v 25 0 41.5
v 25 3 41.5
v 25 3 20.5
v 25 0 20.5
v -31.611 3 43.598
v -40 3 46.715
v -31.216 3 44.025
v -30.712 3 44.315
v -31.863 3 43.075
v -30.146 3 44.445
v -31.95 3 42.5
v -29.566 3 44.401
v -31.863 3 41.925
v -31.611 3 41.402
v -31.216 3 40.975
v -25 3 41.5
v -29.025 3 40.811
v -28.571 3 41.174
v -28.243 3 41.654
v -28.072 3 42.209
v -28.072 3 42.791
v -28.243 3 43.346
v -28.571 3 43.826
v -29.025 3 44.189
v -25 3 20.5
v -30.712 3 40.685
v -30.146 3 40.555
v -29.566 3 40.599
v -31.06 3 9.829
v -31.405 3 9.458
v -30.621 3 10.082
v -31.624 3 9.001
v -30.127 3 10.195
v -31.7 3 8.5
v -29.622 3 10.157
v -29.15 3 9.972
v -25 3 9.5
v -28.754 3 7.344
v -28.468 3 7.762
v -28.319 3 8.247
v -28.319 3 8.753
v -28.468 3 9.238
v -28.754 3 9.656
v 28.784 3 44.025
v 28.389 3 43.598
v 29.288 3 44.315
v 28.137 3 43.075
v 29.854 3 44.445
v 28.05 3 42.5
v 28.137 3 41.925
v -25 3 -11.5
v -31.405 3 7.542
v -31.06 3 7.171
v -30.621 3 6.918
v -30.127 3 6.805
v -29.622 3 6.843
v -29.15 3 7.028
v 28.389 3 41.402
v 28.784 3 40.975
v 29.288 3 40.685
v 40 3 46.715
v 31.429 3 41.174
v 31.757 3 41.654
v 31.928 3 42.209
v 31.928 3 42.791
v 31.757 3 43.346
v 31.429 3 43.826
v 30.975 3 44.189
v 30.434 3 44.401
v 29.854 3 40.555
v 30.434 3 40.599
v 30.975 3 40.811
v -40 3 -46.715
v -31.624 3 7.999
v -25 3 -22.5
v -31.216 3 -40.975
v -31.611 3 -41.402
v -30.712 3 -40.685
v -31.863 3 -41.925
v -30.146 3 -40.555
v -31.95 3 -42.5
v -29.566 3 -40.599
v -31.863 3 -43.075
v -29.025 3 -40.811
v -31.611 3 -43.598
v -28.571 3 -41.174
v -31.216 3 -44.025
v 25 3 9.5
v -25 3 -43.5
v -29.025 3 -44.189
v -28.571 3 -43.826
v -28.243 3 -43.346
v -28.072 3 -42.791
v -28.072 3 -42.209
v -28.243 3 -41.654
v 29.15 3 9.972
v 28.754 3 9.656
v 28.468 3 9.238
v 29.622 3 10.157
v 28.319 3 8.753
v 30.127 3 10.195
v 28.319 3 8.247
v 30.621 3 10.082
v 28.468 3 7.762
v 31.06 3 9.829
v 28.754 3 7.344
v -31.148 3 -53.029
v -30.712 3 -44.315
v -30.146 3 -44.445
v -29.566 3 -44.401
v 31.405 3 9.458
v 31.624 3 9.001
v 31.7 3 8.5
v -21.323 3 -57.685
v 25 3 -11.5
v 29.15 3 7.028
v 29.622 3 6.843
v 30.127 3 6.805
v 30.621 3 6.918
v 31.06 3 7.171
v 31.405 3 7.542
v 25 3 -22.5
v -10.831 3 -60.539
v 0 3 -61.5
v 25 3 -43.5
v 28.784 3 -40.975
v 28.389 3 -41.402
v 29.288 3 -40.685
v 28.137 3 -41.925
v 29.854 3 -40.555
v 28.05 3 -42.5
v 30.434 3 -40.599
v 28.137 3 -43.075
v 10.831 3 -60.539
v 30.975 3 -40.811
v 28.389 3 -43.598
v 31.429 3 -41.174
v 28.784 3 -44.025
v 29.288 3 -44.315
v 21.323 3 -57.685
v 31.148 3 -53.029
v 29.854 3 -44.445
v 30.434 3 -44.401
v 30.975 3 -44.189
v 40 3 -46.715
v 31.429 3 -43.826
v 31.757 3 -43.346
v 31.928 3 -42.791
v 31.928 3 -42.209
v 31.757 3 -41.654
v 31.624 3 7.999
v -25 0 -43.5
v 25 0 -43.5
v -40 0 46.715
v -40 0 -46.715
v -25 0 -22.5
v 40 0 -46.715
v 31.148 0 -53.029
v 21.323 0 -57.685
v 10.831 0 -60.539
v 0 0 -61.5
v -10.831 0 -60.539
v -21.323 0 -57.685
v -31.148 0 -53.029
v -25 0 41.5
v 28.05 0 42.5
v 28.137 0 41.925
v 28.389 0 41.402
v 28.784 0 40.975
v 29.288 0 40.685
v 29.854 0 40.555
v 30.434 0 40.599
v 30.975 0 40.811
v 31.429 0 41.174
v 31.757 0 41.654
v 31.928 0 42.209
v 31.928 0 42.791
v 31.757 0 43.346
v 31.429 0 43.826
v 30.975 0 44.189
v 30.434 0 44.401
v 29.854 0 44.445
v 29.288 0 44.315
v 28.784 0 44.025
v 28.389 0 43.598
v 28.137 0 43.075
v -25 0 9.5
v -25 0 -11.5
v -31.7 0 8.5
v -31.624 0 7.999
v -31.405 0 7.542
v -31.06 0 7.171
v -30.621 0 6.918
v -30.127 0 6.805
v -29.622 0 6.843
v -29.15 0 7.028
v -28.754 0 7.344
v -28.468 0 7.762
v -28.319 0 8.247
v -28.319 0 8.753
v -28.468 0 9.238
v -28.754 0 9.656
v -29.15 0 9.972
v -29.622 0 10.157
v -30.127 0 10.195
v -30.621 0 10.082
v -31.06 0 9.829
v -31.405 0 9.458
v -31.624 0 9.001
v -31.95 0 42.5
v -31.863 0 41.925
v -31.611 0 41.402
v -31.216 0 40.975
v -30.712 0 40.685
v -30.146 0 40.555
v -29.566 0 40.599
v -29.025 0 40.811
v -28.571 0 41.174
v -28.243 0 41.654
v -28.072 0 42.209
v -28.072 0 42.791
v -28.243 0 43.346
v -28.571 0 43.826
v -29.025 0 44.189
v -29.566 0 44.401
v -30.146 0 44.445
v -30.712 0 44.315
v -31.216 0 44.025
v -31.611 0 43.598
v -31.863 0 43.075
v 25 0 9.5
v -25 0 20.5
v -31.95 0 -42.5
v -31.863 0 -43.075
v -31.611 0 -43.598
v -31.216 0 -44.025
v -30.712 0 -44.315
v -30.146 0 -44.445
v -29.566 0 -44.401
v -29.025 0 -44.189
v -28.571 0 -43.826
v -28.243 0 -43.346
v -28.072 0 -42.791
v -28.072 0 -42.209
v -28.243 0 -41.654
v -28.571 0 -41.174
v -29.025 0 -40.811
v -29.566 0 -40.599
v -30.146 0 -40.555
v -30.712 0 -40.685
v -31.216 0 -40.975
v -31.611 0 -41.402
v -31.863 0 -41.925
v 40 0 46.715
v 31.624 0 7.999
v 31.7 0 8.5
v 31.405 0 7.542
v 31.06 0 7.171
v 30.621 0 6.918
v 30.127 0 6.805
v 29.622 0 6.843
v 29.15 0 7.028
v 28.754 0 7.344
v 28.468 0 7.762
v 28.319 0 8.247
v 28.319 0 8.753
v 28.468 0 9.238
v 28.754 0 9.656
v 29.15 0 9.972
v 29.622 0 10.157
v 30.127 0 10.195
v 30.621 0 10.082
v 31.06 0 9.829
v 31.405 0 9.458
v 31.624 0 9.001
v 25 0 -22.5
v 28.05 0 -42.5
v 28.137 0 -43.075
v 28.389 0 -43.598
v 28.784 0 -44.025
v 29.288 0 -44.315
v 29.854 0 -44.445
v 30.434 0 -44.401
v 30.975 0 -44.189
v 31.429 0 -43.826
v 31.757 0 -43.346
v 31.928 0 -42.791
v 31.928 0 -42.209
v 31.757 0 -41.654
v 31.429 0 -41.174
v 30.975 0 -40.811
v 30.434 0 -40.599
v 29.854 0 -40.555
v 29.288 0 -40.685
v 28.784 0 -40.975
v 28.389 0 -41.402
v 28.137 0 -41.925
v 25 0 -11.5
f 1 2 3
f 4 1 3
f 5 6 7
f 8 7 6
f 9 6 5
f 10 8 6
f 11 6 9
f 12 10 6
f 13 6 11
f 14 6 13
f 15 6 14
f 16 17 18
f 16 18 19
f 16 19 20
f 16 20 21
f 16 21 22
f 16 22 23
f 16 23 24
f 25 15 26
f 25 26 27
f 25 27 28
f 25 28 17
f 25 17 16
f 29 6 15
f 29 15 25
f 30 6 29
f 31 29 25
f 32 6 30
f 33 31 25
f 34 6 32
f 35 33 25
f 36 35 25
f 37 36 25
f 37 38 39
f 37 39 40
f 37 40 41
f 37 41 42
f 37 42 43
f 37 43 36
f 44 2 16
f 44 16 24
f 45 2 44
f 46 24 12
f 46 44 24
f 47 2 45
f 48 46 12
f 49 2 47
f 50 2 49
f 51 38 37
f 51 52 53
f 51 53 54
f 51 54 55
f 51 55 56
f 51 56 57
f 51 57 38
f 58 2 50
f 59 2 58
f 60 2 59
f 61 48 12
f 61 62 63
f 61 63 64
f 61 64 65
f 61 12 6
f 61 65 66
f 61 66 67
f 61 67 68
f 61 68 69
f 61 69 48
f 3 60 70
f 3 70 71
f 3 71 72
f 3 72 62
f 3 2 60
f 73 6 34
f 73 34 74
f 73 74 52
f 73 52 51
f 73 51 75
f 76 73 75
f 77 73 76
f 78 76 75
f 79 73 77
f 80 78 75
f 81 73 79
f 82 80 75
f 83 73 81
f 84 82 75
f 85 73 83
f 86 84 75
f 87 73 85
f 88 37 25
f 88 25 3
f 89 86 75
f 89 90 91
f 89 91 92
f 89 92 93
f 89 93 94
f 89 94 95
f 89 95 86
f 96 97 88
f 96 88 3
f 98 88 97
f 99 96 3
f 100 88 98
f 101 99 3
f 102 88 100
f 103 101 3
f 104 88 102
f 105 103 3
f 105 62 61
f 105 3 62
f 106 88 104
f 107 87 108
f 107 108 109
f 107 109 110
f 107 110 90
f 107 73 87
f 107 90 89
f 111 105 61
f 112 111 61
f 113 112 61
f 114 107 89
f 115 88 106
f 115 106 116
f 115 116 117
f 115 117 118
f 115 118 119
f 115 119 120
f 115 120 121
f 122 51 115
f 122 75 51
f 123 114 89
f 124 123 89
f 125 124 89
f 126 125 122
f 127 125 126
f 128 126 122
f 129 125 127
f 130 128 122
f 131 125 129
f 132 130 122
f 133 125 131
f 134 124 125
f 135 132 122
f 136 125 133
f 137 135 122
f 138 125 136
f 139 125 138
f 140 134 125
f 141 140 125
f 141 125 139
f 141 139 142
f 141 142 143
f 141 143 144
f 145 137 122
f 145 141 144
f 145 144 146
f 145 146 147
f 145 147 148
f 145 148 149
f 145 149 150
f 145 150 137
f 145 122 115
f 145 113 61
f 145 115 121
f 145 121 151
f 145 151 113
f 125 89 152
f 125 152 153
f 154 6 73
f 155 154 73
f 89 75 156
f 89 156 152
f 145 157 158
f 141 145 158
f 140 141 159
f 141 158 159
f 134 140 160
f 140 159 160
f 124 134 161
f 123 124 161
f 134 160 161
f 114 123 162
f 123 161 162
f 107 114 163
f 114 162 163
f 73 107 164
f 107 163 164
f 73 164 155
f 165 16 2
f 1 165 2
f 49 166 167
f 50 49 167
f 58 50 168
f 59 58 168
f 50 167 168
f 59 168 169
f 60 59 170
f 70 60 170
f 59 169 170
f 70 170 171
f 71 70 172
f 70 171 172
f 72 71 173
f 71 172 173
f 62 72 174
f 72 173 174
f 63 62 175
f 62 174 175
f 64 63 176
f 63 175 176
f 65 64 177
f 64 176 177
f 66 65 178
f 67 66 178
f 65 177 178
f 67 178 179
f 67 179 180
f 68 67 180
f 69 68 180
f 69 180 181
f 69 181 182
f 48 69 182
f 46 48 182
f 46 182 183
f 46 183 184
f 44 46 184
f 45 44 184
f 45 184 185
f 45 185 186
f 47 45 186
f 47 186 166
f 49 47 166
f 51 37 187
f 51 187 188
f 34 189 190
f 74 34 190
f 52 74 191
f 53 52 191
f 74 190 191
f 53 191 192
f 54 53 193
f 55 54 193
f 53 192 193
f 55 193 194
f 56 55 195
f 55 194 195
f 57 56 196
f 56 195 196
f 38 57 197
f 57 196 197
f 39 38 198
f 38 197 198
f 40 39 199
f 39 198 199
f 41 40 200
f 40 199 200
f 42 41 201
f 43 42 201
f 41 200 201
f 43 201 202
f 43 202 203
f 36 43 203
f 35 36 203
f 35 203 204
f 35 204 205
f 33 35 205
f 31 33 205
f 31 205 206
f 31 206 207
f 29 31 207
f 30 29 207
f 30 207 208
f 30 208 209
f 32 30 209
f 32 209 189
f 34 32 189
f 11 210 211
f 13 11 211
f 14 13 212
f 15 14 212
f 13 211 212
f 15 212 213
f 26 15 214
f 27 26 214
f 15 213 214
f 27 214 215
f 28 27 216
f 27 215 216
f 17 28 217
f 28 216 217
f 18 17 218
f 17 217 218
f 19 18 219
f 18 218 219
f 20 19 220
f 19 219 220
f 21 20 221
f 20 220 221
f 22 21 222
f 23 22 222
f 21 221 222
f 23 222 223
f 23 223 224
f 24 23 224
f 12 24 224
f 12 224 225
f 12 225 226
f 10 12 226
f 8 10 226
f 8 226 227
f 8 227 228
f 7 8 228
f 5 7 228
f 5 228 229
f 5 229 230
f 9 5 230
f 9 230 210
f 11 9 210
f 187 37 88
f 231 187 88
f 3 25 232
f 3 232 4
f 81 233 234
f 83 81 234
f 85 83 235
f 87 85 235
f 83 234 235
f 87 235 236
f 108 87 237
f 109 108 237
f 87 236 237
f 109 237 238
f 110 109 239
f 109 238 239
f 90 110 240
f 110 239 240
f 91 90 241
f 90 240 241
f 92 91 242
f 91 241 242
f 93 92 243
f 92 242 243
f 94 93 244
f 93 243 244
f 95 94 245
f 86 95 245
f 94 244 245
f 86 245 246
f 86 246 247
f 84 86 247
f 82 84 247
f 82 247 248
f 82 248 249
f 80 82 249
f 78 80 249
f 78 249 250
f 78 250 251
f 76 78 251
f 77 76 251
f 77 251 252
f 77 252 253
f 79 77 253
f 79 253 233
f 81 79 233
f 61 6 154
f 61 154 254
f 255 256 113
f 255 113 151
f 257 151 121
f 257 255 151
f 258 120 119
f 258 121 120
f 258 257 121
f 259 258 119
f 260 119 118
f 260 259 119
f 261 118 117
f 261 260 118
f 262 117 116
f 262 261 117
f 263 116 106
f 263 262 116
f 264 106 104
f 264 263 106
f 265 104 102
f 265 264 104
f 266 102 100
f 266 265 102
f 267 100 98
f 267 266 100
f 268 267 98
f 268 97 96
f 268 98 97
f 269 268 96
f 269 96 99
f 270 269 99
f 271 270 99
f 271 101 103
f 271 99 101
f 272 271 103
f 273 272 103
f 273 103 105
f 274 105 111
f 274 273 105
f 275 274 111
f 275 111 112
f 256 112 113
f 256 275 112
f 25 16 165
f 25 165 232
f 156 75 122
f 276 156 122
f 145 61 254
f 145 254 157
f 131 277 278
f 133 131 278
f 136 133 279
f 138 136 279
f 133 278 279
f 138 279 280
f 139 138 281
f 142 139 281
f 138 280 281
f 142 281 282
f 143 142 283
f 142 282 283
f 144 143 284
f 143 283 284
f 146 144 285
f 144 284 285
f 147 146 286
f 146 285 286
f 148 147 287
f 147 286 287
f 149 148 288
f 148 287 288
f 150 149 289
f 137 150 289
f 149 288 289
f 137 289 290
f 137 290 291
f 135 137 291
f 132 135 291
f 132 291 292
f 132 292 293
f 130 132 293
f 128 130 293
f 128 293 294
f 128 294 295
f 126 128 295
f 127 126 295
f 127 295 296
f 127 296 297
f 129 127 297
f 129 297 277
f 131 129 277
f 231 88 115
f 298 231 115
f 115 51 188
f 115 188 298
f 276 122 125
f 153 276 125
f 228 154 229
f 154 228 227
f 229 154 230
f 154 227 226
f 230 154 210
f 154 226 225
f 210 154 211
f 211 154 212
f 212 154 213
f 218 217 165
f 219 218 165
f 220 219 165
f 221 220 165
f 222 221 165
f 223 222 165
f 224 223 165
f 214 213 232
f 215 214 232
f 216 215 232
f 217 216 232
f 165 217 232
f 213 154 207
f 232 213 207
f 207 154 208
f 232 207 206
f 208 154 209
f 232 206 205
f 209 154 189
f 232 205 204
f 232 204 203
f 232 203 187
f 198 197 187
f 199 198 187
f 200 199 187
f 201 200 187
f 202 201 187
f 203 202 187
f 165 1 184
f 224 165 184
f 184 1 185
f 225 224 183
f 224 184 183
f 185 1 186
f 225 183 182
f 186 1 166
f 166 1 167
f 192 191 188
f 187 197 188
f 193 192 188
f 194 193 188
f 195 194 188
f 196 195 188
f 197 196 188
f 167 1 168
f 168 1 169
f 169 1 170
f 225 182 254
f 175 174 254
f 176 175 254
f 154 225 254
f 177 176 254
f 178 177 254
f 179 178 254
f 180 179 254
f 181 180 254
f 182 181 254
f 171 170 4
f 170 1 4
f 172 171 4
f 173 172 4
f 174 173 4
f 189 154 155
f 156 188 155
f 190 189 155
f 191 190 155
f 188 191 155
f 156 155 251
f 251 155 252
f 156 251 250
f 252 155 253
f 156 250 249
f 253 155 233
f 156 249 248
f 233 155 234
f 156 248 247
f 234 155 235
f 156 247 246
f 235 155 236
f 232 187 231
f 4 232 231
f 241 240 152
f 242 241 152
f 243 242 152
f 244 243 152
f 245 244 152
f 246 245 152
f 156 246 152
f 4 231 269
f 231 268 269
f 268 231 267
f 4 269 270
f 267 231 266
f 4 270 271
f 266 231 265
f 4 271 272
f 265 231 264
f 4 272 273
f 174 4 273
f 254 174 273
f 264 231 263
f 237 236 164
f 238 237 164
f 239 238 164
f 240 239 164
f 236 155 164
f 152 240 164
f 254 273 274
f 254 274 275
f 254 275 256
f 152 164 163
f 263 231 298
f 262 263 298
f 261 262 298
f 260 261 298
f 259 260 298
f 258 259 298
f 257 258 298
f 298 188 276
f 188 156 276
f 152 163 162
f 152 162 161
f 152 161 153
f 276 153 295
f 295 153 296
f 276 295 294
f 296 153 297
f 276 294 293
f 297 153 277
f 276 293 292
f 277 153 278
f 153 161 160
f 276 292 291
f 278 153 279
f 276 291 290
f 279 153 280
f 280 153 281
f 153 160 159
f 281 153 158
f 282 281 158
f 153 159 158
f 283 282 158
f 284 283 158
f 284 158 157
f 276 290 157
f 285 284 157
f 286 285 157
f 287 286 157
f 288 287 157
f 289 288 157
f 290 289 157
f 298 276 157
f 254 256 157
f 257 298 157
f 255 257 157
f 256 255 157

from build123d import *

# Parameters (mm, degrees)
ESQUISSE1_R             = 61.5
BOSS_EXTRU_1_DEPTH      = 3
ESQUISSE3_W             = 30.466369815
ESQUISSE3_H             = 114.600421842
ENL_V_MAT_EXTRU_1_DEPTH = 4
D_GAGEMENT_M31_D        = 3.4
D_GAGEMENT_M3_51_D      = 3.9
ESQUISSE15_W            = 50
ESQUISSE15_H            = 21
ESQUISSE15_W_2          = 80
ESQUISSE15_H_2          = 16.662747472
ENL_V_MAT_EXTRU_2_DEPTH = 4


with BuildPart() as part:
    # Esquisse1 → Boss.-Extru.1 (new body)
    with BuildSketch(Plane(origin=(0, 0, 0), x_dir=(1, 0, 0), z_dir=(0, 1, 0))):
        Circle(ESQUISSE1_R)
    extrude(amount=BOSS_EXTRU_1_DEPTH)

    # Esquisse3 → Enlèv. mat.-Extru.1 (cut, through all)
    with BuildSketch(Plane(origin=(0, 3, 0), x_dir=(1, 0, 0), z_dir=(0, 1, 0))):
        with Locations((-55.233184908, -9.960159363)):
            Rectangle(ESQUISSE3_W, ESQUISSE3_H)
        with Locations((55.233184908, -9.960159363)):
            Rectangle(ESQUISSE3_W, ESQUISSE3_H)
    extrude(amount=-ENL_V_MAT_EXTRU_1_DEPTH, mode=Mode.SUBTRACT)

    # Dégagement M31 (through all)
    with Locations(Plane(origin=(0, 3, 0), x_dir=(1, 0, 0), z_dir=(0, 1, 0))):
        with Locations((-30, -8.5)):
            d_gagement_m31 = Hole(D_GAGEMENT_M31_D / 2)

    # Symétrie1: Dégagement M31 across plane
    add(d_gagement_m31.mirror(Plane.ZY), mode=Mode.SUBTRACT)

    # Dégagement M3.51 (through all)
    with Locations(Plane(origin=(0, 3, 0), x_dir=(1, 0, 0), z_dir=(0, 1, 0))):
        with Locations((-30, 42.5), (30, 42.5), (30, -42.5), (-30, -42.5)):
            Hole(D_GAGEMENT_M3_51_D / 2)

    # Esquisse15 → Enlèv. mat.-Extru.2 (cut, through all)
    with BuildSketch(Plane(origin=(0, 3, 0), x_dir=(1, 0, 0), z_dir=(0, 1, 0))):
        with Locations((0, 33)):
            Rectangle(ESQUISSE15_W, ESQUISSE15_H)
        with Locations((0, -55.045932494)):
            Rectangle(ESQUISSE15_W_2, ESQUISSE15_H_2)
        with Locations((0, -31)):
            Rectangle(ESQUISSE15_W, ESQUISSE15_H)
        with Locations((0, 1)):
            Rectangle(ESQUISSE15_W, ESQUISSE15_H)
    extrude(amount=-ENL_V_MAT_EXTRU_2_DEPTH, mode=Mode.SUBTRACT)


solid = part.part
